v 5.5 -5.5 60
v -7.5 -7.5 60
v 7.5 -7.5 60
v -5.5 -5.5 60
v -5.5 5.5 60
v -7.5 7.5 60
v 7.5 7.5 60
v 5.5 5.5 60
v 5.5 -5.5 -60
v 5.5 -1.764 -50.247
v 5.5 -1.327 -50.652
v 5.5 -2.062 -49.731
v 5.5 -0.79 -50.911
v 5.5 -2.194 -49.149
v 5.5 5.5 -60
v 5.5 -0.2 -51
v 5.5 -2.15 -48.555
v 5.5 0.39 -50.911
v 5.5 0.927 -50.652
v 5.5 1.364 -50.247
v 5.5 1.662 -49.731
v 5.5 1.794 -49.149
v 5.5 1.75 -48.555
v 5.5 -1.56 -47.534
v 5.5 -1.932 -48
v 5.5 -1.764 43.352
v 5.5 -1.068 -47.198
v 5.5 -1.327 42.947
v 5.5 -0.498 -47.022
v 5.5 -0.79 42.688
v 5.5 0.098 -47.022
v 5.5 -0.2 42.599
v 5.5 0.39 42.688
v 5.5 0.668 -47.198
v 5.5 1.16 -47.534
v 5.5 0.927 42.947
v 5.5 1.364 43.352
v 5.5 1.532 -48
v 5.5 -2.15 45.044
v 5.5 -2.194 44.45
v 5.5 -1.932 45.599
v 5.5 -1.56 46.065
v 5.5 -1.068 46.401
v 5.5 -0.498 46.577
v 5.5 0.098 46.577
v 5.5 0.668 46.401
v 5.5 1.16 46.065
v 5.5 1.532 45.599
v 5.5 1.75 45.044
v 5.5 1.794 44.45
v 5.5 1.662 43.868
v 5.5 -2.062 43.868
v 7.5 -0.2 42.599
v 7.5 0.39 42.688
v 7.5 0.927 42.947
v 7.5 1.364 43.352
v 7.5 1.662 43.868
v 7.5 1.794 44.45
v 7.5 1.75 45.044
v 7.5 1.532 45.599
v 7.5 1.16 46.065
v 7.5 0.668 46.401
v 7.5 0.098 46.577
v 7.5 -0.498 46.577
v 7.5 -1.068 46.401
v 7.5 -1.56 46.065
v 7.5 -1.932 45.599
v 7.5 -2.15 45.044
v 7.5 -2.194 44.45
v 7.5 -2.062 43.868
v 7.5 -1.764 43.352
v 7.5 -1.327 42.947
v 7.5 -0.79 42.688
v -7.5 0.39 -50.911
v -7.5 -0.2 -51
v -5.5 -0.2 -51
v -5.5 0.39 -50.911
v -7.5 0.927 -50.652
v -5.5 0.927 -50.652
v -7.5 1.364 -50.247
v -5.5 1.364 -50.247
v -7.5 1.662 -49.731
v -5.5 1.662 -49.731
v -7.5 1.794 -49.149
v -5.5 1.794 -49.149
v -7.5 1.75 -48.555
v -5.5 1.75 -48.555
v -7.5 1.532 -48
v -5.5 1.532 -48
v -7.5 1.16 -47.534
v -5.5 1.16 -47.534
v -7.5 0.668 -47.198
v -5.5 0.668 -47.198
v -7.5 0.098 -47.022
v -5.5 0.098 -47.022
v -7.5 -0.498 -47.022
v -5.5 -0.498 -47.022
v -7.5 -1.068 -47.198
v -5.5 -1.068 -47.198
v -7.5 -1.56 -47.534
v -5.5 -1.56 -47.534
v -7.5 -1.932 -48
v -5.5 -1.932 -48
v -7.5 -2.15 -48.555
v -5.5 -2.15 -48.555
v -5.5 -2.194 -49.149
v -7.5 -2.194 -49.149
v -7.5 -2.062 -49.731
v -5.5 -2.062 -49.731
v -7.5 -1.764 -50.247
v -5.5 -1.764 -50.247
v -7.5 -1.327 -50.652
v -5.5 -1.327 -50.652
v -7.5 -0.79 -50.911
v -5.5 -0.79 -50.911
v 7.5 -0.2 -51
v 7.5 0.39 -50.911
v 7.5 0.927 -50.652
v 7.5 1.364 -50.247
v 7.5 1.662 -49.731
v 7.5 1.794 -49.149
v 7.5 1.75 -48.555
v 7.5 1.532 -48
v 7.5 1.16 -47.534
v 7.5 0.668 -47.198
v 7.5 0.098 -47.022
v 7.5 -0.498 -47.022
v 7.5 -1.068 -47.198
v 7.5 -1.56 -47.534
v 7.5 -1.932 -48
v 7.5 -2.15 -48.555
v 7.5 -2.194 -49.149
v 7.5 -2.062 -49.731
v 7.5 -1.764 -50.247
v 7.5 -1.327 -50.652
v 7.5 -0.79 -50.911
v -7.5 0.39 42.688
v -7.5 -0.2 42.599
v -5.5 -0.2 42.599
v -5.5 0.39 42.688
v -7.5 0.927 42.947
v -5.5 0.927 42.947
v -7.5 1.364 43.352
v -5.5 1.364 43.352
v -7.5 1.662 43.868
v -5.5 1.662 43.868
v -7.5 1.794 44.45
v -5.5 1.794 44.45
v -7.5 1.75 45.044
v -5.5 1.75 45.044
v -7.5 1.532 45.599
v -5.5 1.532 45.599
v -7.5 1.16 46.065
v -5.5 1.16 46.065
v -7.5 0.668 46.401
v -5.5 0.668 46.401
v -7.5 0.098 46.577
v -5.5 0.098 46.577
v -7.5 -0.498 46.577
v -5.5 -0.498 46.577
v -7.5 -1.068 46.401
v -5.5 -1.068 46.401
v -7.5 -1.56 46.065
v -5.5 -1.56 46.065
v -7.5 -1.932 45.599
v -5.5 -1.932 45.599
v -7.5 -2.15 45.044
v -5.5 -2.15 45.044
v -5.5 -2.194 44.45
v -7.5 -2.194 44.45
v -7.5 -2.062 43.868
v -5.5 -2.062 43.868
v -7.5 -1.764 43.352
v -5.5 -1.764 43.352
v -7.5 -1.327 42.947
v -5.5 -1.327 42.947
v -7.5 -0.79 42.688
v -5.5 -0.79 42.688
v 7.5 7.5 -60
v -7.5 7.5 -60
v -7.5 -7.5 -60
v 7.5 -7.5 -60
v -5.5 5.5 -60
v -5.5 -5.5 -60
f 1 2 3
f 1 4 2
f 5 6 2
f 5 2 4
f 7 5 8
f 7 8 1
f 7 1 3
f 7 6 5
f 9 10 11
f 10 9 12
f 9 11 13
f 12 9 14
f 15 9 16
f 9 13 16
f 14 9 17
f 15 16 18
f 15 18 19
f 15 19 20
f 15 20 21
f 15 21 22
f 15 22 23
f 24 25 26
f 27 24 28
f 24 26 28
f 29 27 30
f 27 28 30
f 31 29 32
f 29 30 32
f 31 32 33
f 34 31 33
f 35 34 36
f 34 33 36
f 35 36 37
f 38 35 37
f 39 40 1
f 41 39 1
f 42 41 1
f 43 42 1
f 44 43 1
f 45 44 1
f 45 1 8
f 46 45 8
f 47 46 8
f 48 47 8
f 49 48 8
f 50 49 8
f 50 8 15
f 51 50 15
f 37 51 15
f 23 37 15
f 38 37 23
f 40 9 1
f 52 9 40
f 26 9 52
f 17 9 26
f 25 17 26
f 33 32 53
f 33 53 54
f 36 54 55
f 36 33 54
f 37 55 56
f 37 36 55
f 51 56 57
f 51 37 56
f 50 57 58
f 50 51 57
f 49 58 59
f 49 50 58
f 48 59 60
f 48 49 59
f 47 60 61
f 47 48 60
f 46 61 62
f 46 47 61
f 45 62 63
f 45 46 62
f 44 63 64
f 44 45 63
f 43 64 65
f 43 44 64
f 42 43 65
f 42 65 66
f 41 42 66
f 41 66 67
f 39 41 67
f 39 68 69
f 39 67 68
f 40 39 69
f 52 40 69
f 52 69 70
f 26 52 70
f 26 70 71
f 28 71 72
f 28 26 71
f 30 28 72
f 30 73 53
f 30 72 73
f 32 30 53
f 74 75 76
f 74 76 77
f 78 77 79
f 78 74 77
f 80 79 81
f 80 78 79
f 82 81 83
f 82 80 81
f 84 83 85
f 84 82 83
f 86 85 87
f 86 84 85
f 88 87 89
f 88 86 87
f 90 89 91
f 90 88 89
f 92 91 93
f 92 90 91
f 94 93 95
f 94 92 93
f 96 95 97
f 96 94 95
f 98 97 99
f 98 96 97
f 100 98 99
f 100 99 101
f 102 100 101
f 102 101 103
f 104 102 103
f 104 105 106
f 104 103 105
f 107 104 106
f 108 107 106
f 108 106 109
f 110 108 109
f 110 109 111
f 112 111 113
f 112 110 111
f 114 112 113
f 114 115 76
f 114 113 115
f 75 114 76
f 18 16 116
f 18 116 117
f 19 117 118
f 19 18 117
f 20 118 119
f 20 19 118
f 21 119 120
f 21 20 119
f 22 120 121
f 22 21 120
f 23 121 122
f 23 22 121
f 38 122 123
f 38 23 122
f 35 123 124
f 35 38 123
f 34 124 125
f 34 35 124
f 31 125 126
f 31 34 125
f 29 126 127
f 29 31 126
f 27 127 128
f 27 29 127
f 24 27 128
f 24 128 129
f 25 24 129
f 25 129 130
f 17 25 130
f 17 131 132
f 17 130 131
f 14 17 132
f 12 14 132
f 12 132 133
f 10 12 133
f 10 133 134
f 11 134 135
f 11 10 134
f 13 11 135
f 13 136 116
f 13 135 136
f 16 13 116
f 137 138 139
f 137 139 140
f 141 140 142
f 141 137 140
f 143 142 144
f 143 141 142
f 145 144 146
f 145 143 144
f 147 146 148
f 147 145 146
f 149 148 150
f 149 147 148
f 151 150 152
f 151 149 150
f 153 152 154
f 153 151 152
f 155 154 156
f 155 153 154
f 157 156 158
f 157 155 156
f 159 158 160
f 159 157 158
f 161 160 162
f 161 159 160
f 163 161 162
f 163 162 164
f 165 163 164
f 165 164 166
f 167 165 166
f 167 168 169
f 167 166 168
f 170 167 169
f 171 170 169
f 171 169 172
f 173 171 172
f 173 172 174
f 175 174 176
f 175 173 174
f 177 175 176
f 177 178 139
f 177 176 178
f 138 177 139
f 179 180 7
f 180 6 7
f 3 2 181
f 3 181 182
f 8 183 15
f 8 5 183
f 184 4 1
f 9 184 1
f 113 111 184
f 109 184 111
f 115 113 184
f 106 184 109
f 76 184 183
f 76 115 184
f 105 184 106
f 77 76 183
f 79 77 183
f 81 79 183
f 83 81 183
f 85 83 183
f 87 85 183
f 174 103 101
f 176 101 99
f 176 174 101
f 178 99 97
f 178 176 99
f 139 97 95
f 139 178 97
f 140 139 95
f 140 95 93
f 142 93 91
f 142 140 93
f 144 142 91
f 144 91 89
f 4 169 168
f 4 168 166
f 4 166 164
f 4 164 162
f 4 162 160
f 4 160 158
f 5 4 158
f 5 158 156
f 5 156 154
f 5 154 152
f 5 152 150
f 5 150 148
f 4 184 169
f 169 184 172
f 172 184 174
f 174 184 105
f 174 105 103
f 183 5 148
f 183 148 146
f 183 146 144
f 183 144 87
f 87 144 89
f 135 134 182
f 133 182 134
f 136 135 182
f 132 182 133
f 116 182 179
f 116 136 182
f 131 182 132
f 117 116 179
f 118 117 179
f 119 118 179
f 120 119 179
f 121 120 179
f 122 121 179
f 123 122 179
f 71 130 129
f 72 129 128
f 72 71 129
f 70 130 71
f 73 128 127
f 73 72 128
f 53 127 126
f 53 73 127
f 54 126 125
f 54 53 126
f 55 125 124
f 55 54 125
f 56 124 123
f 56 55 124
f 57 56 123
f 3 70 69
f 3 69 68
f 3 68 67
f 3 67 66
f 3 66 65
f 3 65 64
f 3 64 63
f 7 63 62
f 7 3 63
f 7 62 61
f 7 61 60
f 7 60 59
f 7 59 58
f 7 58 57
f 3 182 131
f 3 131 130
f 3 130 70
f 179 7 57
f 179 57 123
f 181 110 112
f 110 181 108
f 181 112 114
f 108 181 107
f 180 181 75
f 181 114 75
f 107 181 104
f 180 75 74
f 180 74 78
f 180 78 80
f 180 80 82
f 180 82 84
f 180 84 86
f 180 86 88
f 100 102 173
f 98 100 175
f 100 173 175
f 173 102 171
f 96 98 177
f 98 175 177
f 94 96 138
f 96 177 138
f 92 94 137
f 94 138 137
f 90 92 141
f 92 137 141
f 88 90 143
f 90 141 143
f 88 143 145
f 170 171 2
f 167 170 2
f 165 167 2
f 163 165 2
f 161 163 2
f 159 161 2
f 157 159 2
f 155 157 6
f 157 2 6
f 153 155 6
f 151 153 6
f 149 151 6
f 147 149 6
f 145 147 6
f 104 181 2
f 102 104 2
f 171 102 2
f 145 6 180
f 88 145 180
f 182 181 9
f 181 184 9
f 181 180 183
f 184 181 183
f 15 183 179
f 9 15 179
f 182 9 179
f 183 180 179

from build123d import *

# Parameters (mm, degrees)
SKETCH1_W               = 15
SKETCH1_H               = 15
SKETCH1_W_2             = 11
SKETCH1_H_2             = 11
BOSS_EXTRUDE1_DEPTH     = 60
CUT_EXTRUDE1_DEPTH      = 63.299678972
CUT_EXTRUDE1_DEPTH_BACK = 63.299678972
SKETCH2_R               = 2


with BuildPart() as part:
    # Sketch1 → Boss-Extrude1 (new, symmetric)
    with BuildSketch(Plane.XY):
        Rectangle(SKETCH1_W, SKETCH1_H)
        Rectangle(SKETCH1_W_2, SKETCH1_H_2, mode=Mode.SUBTRACT)
    extrude(amount=BOSS_EXTRUDE1_DEPTH, both=True)

    # Sketch2 → Cut-Extrude1 (cut, two sides: drawn at the far end of the back side and taken through both)
    with BuildSketch(Plane(origin=(7.5, 0, 0), x_dir=(0, 0, -1), z_dir=(1, 0, 0)).offset(-CUT_EXTRUDE1_DEPTH_BACK)):
        with Locations((-44.599061213, -0.2)):
            Circle(SKETCH2_R)
        with Locations((49, -0.2)):
            Circle(SKETCH2_R)
    extrude(amount=CUT_EXTRUDE1_DEPTH + CUT_EXTRUDE1_DEPTH_BACK, mode=Mode.SUBTRACT)


solid = part.part
